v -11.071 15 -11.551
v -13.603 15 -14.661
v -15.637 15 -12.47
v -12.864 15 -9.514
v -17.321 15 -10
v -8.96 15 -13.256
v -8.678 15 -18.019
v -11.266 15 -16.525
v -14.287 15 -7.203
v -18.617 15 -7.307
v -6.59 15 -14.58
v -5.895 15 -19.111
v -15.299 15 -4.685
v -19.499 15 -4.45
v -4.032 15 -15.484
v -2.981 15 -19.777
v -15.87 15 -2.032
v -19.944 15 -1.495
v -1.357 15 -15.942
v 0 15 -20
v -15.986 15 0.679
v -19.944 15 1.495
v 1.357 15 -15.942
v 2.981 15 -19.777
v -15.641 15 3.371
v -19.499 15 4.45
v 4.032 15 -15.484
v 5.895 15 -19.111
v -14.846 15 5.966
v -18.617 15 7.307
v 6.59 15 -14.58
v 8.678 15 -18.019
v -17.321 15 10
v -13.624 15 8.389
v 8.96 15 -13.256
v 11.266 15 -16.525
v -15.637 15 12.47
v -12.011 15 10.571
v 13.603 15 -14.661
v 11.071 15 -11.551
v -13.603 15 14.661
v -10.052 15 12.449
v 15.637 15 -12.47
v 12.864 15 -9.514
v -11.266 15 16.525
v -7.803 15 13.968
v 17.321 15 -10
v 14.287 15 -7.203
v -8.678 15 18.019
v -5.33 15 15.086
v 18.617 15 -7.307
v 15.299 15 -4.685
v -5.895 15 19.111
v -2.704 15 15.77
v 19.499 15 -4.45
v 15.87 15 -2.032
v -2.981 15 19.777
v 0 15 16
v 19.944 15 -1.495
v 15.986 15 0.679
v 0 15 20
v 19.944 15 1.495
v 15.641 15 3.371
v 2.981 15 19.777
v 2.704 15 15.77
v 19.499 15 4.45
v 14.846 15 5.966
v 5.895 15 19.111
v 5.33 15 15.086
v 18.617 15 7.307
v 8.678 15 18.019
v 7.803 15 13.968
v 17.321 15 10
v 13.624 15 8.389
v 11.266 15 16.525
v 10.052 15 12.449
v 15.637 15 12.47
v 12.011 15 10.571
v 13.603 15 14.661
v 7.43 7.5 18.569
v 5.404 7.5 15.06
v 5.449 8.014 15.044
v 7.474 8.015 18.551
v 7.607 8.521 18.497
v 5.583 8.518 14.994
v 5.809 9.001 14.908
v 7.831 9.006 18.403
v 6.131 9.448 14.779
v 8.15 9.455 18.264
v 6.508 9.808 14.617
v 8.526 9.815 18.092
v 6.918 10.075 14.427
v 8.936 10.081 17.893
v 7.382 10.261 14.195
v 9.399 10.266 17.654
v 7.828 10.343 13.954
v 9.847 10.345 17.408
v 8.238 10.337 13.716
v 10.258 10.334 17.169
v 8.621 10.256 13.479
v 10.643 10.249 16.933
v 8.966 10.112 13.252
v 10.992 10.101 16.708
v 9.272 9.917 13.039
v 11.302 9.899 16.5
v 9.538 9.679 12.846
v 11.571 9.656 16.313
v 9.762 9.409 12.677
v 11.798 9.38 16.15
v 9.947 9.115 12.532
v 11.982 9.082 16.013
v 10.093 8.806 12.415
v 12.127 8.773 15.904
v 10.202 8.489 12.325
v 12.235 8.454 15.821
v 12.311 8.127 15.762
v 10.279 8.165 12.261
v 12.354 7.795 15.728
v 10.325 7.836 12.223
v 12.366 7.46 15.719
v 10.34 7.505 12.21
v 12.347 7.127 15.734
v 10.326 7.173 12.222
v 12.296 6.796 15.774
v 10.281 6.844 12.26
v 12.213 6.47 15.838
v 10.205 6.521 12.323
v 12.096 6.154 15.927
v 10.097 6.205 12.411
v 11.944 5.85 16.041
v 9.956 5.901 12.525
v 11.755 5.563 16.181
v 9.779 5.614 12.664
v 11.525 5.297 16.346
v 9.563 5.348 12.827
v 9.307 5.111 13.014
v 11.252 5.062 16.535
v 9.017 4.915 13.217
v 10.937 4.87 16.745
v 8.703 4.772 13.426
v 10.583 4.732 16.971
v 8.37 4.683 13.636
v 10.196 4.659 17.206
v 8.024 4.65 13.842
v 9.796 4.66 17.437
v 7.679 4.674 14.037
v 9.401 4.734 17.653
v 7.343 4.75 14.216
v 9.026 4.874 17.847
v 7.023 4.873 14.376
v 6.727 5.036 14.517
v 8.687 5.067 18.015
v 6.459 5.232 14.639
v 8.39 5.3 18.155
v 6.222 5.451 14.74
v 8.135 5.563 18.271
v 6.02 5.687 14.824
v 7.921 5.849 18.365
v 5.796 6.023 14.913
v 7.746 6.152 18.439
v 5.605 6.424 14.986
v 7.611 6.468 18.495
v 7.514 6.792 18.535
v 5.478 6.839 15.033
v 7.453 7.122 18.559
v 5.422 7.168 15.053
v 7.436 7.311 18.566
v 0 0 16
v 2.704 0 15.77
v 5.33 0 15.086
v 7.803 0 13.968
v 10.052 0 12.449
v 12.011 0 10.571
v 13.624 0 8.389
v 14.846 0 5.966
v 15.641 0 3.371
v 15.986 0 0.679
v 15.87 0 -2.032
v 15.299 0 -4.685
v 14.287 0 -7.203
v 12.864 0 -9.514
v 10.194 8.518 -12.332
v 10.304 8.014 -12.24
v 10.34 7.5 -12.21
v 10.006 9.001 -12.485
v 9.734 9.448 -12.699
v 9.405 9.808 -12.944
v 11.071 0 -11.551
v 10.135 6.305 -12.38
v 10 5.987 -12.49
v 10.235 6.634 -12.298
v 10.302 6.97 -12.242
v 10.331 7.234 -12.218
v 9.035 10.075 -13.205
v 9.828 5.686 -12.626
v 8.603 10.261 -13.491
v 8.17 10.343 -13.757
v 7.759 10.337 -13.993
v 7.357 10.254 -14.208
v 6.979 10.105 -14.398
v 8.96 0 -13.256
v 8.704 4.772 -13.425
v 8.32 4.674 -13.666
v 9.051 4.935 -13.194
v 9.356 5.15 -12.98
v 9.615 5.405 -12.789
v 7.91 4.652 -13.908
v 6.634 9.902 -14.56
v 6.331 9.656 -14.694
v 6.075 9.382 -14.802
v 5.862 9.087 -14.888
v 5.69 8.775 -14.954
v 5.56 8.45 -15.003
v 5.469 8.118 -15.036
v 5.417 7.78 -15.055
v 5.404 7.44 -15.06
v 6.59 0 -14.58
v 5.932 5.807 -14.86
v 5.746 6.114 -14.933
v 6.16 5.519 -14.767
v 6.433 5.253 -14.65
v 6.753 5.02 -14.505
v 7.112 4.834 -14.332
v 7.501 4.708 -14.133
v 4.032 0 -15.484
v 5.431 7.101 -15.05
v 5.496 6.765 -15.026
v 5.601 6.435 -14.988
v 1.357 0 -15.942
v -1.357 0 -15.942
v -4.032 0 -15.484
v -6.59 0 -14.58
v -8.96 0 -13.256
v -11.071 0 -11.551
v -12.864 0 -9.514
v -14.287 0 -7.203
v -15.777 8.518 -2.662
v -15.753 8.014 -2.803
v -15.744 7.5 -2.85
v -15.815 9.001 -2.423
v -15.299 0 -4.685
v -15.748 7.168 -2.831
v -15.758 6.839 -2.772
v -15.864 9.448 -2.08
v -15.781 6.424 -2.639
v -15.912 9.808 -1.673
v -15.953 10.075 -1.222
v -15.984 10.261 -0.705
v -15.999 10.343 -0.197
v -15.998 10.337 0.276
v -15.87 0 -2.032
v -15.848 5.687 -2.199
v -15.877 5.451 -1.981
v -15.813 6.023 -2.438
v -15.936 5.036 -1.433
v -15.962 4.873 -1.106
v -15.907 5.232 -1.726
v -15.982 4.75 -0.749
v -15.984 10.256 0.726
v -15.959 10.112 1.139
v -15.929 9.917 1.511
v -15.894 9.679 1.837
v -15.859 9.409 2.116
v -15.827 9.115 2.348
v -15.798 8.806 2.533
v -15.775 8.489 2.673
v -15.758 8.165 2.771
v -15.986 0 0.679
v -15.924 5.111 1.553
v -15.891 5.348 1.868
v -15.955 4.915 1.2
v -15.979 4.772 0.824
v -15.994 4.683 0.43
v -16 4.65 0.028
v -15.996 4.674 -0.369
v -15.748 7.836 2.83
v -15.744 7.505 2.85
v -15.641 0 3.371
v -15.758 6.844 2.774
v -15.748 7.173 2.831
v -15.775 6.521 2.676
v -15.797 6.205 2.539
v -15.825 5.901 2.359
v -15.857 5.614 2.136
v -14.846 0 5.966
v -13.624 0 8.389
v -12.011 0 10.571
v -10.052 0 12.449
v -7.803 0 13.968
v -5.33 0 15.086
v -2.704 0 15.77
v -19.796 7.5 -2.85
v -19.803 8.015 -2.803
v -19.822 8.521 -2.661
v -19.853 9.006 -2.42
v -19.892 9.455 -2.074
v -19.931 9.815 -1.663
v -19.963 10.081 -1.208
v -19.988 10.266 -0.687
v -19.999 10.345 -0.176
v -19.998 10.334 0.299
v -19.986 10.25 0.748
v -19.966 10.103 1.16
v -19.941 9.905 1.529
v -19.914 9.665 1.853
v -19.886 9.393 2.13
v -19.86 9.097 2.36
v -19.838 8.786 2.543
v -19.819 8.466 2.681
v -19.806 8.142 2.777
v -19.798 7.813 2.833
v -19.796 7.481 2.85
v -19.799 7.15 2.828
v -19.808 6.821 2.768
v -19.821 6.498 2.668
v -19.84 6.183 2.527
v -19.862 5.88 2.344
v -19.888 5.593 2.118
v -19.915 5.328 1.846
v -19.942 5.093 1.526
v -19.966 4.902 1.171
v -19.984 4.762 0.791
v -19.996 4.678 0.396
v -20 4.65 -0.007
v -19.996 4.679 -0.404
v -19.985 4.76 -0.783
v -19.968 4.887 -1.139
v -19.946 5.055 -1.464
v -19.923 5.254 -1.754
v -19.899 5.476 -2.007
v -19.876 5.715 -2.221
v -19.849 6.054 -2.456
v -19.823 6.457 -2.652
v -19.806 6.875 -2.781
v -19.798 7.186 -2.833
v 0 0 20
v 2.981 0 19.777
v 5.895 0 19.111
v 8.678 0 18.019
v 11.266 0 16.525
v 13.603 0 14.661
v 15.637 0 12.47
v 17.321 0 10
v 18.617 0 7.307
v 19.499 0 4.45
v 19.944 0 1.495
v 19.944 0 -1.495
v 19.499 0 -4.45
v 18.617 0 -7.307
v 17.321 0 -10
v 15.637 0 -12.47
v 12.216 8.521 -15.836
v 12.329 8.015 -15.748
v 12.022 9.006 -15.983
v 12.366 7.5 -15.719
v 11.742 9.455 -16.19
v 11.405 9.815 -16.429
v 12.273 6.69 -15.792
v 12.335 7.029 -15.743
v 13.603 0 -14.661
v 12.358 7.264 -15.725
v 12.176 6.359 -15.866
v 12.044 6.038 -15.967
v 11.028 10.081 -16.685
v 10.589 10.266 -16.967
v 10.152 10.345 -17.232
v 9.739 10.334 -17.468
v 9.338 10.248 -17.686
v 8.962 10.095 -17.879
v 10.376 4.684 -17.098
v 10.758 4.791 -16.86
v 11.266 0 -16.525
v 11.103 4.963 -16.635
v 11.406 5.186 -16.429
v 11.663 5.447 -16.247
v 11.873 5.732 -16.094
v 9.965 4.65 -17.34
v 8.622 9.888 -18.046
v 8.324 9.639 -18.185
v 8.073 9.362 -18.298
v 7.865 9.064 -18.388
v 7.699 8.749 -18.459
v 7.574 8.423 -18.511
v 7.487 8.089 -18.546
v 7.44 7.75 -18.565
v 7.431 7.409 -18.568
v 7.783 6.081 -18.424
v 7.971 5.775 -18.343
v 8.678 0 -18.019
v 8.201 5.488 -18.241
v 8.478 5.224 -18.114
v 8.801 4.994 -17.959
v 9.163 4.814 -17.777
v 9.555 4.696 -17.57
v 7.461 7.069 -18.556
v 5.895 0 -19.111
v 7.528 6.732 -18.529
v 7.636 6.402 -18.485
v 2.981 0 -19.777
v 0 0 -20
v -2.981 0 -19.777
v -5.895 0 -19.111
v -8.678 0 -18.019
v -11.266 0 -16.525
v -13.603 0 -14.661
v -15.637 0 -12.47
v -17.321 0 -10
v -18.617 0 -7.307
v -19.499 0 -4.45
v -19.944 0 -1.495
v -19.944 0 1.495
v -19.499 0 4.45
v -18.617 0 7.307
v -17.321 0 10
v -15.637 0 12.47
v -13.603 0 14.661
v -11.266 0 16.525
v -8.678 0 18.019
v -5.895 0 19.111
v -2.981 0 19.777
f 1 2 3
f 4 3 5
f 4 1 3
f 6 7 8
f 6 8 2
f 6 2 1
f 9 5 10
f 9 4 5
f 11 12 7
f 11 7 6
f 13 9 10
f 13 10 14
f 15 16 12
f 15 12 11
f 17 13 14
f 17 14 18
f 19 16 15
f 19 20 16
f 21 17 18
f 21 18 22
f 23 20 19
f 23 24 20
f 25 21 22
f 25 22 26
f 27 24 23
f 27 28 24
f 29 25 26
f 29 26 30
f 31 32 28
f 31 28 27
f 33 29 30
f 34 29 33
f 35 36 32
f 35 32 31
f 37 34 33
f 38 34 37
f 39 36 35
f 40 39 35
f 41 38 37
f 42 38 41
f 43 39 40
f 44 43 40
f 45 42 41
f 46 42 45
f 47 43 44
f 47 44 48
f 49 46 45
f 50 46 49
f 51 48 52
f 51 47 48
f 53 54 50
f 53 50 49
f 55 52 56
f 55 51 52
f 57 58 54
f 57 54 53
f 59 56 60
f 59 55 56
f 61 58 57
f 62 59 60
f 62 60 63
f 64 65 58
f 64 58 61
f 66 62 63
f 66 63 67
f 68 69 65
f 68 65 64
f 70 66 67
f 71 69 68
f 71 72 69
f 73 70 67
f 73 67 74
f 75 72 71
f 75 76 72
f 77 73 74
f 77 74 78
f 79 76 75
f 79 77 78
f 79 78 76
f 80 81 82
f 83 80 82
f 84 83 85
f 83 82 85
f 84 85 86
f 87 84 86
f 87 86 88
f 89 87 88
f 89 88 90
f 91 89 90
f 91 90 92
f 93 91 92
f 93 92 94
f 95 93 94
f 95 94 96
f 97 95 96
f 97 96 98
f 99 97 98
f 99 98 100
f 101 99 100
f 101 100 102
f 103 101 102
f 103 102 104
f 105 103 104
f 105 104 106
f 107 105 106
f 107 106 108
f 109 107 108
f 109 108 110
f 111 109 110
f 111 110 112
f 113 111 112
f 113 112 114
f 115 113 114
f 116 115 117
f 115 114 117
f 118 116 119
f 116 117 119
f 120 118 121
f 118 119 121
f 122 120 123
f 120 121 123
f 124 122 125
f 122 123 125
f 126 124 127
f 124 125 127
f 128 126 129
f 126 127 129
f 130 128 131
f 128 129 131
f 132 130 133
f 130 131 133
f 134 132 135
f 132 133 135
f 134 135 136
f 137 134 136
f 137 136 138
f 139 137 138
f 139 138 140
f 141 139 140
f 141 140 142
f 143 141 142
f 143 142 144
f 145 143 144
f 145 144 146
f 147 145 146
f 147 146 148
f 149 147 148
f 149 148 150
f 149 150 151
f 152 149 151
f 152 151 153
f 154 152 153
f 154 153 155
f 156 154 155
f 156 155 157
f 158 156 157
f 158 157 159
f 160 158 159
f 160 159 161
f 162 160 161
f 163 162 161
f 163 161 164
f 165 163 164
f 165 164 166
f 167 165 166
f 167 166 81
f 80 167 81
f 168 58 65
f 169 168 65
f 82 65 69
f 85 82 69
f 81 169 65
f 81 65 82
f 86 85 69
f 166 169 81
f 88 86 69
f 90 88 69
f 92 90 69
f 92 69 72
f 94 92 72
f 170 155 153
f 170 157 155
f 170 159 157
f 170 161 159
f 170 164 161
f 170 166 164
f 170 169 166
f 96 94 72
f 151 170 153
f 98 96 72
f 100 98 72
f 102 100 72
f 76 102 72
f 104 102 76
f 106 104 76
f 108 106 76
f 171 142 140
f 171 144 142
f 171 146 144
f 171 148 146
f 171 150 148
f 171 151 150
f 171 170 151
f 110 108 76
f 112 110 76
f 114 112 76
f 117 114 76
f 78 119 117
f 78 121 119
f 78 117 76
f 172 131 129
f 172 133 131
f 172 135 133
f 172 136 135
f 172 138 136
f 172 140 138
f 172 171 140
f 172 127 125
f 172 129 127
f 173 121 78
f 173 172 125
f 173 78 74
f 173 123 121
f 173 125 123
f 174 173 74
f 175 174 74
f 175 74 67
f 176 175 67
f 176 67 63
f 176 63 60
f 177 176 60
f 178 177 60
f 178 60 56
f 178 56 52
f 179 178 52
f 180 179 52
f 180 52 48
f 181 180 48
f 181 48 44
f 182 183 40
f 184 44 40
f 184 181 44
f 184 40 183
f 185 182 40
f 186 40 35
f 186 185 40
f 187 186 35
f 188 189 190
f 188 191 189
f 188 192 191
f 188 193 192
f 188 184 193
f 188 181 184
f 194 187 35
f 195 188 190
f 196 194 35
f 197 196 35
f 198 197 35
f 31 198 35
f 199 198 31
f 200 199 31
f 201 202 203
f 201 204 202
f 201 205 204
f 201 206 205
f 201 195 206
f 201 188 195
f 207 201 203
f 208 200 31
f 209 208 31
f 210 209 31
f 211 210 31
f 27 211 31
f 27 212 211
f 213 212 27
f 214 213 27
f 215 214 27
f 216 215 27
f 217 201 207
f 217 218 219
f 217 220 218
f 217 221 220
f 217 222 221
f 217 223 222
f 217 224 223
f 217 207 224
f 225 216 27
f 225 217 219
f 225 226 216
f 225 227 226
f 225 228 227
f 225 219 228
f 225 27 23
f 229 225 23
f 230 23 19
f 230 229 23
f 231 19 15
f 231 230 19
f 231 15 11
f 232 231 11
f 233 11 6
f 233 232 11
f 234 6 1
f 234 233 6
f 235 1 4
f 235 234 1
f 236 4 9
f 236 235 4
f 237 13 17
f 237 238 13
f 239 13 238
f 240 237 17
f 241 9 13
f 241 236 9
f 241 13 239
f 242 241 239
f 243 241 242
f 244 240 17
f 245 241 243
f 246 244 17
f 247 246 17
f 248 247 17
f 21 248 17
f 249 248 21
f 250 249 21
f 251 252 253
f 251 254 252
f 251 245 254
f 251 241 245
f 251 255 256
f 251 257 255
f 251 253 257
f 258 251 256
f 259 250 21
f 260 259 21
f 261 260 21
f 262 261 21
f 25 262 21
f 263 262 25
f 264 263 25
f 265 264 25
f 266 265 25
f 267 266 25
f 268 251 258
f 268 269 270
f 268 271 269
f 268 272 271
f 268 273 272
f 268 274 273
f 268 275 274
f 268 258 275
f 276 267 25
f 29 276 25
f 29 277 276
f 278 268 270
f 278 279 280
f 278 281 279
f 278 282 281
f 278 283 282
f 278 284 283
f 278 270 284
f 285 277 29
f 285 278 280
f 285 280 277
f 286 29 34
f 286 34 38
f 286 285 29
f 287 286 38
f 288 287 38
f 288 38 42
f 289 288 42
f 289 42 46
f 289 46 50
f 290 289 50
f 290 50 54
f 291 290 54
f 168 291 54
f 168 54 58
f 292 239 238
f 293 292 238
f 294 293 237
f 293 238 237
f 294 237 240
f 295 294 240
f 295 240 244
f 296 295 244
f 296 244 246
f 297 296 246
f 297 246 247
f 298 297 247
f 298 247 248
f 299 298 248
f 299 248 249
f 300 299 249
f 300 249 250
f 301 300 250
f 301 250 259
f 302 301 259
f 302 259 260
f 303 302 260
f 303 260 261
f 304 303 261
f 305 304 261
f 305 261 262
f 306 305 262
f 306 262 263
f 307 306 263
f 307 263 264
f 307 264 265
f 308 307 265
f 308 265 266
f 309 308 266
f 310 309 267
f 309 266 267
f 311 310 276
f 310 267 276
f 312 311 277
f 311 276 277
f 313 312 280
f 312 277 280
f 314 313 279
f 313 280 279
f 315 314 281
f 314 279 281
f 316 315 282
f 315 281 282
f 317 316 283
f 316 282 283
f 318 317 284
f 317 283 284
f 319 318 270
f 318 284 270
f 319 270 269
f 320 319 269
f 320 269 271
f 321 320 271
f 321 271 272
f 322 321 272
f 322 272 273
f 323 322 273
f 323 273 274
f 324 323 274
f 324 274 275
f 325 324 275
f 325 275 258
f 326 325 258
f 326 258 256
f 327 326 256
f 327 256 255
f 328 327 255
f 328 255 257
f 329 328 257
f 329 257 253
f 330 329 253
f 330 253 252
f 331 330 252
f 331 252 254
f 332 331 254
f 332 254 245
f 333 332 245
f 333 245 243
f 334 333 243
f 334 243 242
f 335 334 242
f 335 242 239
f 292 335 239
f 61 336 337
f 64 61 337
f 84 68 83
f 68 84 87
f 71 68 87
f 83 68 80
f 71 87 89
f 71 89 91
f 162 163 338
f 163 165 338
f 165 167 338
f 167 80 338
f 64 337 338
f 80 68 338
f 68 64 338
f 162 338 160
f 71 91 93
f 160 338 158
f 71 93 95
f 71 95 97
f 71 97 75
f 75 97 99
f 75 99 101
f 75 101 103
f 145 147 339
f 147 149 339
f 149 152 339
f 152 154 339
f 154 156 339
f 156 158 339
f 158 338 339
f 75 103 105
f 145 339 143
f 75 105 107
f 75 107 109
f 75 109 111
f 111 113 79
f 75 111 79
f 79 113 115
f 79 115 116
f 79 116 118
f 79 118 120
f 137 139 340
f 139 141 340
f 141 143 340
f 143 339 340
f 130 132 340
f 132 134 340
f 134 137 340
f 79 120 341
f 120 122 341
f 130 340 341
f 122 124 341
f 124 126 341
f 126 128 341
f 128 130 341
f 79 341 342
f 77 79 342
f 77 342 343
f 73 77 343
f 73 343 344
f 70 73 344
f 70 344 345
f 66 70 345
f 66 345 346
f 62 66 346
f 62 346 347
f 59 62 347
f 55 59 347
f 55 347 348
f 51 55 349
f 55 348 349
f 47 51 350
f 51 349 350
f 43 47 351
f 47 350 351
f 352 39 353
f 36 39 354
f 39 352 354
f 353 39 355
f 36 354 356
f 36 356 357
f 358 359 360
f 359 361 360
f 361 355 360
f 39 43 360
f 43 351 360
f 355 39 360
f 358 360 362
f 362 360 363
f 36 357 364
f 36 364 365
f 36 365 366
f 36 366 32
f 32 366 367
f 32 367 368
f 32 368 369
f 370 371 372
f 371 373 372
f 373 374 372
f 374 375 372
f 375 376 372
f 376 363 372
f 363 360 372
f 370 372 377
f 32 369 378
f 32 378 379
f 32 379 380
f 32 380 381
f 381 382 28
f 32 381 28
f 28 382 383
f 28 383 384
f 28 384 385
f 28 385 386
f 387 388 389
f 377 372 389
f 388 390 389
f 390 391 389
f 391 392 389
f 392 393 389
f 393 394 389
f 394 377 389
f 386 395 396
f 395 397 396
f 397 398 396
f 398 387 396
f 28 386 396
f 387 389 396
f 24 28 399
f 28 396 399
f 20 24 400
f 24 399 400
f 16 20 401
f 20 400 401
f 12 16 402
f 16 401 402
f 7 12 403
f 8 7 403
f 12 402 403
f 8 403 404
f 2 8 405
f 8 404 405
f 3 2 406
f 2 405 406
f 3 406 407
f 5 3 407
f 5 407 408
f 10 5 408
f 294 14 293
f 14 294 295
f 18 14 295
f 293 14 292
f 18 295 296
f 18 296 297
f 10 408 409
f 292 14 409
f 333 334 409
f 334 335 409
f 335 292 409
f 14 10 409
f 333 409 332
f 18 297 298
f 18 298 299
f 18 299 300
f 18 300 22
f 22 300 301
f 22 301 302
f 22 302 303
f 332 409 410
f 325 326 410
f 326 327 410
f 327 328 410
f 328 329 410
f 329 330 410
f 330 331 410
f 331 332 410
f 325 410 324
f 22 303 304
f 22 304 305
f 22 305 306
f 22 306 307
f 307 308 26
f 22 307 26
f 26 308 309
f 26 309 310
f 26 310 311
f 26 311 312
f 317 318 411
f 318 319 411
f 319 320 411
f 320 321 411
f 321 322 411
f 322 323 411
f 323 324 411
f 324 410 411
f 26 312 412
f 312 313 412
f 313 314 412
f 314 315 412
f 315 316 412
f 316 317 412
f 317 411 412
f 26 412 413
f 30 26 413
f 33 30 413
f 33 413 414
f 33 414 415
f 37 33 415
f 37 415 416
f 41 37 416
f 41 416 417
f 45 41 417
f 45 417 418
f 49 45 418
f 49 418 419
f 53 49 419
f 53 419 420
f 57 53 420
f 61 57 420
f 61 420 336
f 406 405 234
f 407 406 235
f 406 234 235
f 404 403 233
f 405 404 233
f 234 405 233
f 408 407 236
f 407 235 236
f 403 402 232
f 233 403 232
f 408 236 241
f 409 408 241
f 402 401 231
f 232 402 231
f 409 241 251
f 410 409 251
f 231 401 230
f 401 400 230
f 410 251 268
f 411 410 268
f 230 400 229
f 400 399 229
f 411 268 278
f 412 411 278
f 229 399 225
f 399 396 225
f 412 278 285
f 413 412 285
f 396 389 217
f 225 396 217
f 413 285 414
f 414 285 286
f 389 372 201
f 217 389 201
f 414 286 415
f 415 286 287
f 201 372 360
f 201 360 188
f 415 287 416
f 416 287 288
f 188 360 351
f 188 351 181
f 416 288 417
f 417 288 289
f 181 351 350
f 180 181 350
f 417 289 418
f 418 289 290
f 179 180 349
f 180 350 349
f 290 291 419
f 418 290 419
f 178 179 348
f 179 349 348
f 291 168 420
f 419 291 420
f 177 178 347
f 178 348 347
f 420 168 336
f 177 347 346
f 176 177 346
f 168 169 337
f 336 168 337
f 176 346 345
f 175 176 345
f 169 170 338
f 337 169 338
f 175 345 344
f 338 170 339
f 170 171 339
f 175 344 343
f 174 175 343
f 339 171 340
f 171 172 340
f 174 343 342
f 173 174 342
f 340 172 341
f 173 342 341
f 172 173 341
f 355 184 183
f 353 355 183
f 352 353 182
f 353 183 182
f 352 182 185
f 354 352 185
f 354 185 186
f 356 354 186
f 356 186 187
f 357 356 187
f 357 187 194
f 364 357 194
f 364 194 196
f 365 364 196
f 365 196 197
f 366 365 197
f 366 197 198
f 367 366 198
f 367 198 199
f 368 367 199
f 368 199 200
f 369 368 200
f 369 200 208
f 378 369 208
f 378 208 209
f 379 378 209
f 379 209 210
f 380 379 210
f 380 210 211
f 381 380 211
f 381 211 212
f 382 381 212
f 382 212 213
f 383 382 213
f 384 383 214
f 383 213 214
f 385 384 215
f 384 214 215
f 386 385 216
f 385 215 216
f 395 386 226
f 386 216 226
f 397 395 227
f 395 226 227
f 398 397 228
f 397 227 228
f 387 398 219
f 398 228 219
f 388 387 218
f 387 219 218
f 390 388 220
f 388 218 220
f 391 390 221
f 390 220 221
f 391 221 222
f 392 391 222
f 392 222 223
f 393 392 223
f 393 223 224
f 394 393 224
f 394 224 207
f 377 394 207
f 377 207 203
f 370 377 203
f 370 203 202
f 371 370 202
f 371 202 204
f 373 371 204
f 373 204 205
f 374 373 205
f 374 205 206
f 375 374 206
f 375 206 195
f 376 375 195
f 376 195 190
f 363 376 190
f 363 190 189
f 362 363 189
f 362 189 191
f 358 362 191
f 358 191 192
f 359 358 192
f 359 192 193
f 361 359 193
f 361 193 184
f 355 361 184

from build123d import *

# Parameters (mm, degrees)
CROQUIS1_R              = 20
CROQUIS1_R_2            = 16
SALIENTE_EXTRUIR1_DEPTH = 15
CROQUIS3_R              = 2.85
CORTAR_EXTRUIR1_DEPTH   = 33.015621187
CROQUIS7_R              = 2.85
CORTAR_EXTRUIR3_DEPTH   = 33.015621359
CROQUIS9_R              = 2.85
CORTAR_EXTRUIR5_DEPTH   = 33.015621359


with BuildPart() as part:
    # Croquis1 → Saliente-Extruir1 (new body)
    with BuildSketch(Plane(origin=(0, 0, 0), x_dir=(1, 0, 0), z_dir=(0, 1, 0))):
        Circle(CROQUIS1_R)
        Circle(CROQUIS1_R_2, mode=Mode.SUBTRACT)
    extrude(amount=SALIENTE_EXTRUIR1_DEPTH)

    # Croquis3 → Cortar-Extruir1 (cut, through all)
    with BuildSketch(Plane(origin=(0, 0, 0), x_dir=(0, 0, -1), z_dir=(1, 0, 0))):
        with Locations((0, 7.5)):
            Circle(CROQUIS3_R)
    extrude(amount=-CORTAR_EXTRUIR1_DEPTH, mode=Mode.SUBTRACT)

    # Croquis7 → Cortar-Extruir3 (cut, through all)
    with BuildSketch(Plane(origin=(0, 0, 0), x_dir=(0.8660254037844363, 0, 0.500000000000004), z_dir=(-0.5000000000000041, 0, 0.8660254037844364))):
        with Locations((0, 7.5)):
            Circle(CROQUIS7_R)
    extrude(amount=-CORTAR_EXTRUIR3_DEPTH, mode=Mode.SUBTRACT)

    # Croquis9 → Cortar-Extruir5 (cut, through all)
    with BuildSketch(Plane(origin=(0, 0, 0), x_dir=(-0.8660254037844434, 0, 0.499999999999992), z_dir=(-0.499999999999992, 0, -0.8660254037844434))):
        with Locations((0, 7.5)):
            Circle(CROQUIS9_R)
    extrude(amount=-CORTAR_EXTRUIR5_DEPTH, mode=Mode.SUBTRACT)


solid = part.part
